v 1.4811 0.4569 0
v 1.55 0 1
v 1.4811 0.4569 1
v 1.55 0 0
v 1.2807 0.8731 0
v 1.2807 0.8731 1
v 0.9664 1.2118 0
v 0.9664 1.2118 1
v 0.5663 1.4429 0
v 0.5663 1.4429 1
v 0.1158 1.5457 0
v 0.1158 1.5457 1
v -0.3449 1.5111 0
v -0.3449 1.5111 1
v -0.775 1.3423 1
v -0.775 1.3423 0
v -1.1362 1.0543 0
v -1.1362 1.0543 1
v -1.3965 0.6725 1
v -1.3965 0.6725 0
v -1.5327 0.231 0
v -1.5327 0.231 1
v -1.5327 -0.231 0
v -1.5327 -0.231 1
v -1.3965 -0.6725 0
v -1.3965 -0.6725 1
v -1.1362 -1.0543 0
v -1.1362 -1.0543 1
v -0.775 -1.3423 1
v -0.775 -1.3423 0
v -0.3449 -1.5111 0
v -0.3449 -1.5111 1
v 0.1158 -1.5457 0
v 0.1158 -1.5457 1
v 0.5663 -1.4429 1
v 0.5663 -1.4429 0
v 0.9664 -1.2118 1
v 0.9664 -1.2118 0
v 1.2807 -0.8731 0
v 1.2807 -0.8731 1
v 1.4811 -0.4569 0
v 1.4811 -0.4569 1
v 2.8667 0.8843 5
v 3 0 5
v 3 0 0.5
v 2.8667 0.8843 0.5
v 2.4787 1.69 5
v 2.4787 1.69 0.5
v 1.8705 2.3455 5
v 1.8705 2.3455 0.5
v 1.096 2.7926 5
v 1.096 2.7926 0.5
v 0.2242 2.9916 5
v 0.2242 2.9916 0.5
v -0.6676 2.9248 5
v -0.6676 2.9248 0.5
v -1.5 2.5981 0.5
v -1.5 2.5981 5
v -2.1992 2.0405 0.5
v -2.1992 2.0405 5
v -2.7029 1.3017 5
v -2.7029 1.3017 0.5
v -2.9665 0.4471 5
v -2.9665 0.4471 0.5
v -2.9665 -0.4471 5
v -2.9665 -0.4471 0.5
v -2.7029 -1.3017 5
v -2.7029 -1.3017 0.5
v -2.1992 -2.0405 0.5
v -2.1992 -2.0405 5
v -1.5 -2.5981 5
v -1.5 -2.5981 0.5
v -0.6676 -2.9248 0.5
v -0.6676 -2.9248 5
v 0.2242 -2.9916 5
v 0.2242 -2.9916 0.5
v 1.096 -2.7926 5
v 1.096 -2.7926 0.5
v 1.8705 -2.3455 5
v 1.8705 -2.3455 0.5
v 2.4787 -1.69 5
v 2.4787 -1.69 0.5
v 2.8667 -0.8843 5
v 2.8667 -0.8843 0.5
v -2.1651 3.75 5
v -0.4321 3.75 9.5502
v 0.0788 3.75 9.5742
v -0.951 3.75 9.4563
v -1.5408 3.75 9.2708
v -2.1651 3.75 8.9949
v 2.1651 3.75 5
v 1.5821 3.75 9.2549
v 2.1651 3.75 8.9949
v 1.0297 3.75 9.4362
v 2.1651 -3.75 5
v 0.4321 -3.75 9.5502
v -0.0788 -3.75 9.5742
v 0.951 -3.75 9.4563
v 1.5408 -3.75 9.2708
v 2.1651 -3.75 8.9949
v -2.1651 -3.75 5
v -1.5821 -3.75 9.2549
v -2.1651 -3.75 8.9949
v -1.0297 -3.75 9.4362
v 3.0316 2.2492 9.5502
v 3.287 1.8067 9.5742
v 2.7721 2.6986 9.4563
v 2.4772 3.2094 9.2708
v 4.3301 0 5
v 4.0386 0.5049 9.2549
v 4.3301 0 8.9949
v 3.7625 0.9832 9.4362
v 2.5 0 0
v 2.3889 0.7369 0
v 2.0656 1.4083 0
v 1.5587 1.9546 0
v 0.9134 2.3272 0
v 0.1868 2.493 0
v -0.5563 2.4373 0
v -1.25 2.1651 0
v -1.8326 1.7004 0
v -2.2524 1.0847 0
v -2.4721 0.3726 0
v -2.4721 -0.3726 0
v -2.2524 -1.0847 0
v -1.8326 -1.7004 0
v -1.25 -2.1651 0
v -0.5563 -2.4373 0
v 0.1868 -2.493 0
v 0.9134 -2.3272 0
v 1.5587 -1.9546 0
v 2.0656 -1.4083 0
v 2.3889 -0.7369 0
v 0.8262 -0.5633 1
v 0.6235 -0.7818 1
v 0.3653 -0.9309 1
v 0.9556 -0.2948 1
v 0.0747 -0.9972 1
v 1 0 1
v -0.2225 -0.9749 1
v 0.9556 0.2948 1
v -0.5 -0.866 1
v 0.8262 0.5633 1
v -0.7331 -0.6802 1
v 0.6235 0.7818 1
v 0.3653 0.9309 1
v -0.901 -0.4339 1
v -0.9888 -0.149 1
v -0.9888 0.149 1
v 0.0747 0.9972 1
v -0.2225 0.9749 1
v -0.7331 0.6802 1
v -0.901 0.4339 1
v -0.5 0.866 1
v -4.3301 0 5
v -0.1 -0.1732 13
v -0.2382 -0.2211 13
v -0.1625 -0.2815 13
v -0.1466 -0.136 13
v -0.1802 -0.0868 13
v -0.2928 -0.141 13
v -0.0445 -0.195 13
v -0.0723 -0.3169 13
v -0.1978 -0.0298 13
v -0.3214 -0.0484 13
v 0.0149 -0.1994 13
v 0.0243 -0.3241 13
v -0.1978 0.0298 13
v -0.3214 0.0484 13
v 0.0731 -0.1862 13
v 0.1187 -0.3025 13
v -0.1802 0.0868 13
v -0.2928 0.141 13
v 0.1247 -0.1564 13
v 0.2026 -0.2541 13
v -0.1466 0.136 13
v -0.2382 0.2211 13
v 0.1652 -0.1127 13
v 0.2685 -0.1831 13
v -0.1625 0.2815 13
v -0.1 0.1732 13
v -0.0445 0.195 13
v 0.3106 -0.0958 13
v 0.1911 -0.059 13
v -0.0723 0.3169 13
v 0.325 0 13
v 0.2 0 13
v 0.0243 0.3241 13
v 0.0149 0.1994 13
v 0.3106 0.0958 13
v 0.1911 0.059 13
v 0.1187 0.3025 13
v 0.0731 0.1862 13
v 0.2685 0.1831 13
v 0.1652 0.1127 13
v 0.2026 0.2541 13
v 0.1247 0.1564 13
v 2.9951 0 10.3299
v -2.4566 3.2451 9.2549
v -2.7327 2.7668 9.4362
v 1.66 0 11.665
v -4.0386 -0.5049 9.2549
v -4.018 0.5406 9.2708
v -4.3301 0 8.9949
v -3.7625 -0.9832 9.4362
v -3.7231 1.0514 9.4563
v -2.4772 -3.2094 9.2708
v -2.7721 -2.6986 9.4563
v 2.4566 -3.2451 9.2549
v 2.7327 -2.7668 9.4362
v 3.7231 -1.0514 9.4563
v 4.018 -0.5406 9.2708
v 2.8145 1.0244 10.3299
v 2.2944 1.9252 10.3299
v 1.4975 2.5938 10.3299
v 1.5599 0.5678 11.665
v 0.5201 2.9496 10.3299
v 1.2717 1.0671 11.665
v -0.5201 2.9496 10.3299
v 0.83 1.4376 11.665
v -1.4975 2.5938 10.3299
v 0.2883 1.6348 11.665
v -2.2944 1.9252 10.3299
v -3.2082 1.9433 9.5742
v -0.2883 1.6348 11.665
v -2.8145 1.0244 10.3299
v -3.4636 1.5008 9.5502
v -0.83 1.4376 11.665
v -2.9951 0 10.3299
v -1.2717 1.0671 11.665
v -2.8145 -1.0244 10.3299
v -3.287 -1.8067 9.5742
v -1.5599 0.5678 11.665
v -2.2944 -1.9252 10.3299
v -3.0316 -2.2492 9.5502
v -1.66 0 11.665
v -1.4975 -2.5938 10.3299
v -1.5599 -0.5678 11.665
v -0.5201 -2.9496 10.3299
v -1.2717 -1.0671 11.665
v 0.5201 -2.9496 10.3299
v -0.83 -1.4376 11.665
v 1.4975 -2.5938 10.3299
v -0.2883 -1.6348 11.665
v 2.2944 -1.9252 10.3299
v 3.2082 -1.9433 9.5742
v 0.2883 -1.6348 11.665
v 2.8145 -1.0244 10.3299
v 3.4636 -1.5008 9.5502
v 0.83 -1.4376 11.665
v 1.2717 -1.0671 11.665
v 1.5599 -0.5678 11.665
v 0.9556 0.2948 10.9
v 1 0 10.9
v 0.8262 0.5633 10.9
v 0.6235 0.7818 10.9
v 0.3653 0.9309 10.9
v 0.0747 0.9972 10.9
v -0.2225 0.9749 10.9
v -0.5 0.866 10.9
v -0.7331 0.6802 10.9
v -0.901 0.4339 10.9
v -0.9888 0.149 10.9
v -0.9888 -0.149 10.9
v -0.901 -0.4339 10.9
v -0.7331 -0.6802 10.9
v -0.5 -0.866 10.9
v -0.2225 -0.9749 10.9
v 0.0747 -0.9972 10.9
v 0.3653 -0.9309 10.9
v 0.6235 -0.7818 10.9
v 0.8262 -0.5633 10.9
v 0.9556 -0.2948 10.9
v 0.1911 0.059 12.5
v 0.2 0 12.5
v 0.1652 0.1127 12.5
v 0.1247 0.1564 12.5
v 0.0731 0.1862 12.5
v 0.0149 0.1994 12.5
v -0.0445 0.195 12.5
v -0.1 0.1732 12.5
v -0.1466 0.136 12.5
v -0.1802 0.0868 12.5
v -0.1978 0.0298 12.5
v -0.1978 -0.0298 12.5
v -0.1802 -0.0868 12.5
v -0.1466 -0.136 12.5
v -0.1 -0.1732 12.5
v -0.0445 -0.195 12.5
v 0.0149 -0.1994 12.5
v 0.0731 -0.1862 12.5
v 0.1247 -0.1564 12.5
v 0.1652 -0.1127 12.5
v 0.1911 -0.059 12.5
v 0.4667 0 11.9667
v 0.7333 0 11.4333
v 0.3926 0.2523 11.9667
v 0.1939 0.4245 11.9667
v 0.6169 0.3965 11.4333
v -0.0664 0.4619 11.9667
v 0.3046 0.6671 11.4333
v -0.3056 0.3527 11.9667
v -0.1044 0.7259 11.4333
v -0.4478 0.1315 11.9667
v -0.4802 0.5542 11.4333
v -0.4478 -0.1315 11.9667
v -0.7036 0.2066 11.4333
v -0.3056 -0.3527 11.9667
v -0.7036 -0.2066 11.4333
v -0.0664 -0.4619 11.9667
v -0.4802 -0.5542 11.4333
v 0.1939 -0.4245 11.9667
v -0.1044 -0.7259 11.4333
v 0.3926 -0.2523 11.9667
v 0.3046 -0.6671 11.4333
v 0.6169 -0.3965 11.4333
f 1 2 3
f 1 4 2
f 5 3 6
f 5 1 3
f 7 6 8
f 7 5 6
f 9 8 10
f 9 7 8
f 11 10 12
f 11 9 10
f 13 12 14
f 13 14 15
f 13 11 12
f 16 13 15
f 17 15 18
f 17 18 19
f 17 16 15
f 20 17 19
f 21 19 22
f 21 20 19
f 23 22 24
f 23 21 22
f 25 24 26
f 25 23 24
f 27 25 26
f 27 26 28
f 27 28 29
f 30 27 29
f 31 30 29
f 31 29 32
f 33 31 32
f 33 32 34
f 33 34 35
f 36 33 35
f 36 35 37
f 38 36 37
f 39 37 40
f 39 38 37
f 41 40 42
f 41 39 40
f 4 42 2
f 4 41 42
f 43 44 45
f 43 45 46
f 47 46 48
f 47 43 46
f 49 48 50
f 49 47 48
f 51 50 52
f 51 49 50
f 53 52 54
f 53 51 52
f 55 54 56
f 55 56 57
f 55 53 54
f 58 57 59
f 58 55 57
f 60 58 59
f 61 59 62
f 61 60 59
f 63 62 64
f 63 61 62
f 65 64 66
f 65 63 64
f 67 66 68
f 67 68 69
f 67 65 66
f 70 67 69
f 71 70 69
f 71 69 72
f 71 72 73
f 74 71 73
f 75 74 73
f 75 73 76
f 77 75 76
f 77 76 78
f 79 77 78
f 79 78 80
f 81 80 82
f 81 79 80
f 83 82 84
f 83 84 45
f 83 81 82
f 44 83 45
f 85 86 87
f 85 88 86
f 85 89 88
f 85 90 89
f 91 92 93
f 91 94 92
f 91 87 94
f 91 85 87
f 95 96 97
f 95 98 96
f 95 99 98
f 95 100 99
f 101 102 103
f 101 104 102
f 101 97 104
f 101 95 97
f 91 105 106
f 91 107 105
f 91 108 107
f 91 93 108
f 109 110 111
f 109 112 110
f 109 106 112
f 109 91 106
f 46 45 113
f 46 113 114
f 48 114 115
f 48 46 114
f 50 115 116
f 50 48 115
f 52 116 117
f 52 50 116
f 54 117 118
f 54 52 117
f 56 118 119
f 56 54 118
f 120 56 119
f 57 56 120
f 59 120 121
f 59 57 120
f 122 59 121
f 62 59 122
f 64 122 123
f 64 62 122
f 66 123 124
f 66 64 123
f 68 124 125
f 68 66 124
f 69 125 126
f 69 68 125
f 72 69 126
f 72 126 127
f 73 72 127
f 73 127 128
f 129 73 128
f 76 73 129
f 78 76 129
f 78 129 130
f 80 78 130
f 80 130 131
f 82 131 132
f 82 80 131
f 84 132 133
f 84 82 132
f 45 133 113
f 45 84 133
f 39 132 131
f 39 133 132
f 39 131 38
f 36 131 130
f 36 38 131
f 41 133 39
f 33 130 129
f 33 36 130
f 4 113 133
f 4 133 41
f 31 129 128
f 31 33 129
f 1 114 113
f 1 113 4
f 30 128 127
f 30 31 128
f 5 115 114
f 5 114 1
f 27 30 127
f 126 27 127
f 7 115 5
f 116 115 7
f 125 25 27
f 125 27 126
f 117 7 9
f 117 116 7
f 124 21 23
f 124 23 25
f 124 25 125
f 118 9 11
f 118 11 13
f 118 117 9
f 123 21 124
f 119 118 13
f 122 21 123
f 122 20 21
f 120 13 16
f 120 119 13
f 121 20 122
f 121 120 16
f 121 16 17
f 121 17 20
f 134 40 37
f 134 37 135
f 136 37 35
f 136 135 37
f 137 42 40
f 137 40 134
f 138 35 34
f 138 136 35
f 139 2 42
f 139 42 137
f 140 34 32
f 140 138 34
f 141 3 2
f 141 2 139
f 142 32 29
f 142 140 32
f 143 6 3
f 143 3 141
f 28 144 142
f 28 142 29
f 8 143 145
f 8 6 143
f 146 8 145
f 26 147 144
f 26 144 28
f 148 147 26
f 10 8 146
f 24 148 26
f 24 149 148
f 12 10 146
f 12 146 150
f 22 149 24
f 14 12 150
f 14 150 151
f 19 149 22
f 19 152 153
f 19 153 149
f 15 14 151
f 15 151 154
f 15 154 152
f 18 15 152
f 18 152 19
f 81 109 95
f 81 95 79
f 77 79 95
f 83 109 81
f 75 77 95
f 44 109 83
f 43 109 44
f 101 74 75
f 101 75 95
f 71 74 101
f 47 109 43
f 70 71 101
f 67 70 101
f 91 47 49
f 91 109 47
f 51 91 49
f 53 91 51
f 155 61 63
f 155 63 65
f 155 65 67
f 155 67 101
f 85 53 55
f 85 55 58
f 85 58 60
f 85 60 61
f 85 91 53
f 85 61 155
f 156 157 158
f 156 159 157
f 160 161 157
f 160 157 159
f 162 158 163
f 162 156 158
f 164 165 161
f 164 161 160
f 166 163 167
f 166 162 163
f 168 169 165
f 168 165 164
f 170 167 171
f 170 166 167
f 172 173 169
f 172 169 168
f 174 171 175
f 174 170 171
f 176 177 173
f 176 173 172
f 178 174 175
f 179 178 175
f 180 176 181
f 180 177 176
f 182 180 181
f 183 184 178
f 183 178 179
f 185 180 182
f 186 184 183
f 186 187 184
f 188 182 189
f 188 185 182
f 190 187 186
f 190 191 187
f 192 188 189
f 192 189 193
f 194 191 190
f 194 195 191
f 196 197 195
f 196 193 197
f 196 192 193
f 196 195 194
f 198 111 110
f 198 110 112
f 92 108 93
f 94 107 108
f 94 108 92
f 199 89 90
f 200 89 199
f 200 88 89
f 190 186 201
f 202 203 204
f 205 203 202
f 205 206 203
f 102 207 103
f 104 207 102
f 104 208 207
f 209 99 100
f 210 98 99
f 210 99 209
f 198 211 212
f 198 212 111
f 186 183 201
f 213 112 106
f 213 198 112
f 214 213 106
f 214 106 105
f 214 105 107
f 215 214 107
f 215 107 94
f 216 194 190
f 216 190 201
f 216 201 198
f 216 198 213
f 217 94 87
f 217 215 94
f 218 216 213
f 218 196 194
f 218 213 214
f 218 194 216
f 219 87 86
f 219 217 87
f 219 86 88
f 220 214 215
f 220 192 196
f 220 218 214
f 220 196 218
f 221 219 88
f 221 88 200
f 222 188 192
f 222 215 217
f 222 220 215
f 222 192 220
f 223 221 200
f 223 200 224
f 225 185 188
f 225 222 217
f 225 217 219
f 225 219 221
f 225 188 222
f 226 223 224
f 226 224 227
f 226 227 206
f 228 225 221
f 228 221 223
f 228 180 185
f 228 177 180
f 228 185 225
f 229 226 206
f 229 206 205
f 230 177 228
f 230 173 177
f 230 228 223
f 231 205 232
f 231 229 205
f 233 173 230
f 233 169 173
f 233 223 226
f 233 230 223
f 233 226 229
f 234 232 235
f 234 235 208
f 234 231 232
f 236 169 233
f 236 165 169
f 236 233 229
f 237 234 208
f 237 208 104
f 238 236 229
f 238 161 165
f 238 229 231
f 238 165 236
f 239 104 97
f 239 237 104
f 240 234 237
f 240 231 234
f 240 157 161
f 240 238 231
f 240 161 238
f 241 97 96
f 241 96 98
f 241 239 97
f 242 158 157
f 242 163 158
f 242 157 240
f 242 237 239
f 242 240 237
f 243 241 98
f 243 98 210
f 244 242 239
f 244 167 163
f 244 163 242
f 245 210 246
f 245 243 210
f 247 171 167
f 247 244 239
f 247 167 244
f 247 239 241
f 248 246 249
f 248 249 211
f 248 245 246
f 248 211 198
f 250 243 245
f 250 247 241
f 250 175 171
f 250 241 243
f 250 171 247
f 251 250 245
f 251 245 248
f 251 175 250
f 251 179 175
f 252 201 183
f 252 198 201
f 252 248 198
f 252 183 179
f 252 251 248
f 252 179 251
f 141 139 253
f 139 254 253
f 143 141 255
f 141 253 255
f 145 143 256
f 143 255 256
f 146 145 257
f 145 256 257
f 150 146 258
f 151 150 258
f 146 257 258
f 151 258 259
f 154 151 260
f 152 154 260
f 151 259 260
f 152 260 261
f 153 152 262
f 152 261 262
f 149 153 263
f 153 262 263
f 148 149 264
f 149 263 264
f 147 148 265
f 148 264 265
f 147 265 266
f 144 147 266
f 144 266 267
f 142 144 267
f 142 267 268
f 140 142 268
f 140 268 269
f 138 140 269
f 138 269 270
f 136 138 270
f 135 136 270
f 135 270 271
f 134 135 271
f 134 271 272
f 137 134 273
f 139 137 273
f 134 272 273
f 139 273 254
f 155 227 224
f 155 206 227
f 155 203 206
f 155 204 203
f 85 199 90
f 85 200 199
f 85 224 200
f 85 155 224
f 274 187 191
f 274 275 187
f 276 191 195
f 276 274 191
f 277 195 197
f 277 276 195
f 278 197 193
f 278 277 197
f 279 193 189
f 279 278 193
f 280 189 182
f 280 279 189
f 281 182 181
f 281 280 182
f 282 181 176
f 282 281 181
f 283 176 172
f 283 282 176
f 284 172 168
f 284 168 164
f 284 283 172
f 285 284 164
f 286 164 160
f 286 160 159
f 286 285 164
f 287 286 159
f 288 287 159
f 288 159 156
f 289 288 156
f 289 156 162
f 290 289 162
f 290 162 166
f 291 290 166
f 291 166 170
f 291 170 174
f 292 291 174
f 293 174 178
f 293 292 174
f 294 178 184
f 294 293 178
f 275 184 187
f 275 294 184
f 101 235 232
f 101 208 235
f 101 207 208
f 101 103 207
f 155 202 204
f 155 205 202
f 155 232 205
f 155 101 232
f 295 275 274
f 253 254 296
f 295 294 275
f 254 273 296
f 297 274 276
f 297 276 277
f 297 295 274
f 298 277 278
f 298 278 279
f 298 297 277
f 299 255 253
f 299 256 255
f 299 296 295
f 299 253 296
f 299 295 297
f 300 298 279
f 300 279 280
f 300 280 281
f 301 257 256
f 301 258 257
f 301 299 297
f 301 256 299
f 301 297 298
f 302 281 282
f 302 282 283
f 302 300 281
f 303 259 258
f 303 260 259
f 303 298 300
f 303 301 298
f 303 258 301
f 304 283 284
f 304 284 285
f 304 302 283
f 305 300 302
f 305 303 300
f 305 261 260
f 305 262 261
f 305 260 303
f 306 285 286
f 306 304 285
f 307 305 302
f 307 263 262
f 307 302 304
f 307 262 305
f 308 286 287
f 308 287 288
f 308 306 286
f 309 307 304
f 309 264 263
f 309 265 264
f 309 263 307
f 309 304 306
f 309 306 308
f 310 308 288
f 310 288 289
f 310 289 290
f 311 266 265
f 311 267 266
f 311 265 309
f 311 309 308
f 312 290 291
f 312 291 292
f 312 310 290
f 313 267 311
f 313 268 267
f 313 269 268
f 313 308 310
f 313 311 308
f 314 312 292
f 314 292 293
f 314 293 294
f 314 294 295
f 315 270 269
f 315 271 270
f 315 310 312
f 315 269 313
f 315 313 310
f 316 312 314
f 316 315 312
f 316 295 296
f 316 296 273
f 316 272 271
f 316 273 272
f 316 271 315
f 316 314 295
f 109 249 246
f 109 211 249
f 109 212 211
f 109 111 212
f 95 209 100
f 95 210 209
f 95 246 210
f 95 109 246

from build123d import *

# Parameters (mm, degrees)
SKETCH2_R          = 8.325
CUT_EXTRUDE2_DEPTH = 10
CHAMFER1_SIZE      = 0.5


with BuildPart() as part:
    # Sketch1 → Revolve1 (revolve)
    with BuildSketch(Plane(origin=(0, 0, 0), x_dir=(1, 0, 0), z_dir=(0, 1, 0))):
        Polygon((1.55, 0), (3, 0), (3, -5), (8.325, -5), (0.325, -13), (0.2, -13), (0.2, -12.5), (1, -10.9), (1, -10), (1, -1), (1.55, -1), align=None)
    revolve(axis=Axis((0, 0, 0), (0, 0, 1)))

    # Sketch2 → Cut-Extrude2 (cut)
    with BuildSketch(Plane(origin=(0, 0, 5), x_dir=(-1, 0, 0), z_dir=(0, 0, -1))):
        Circle(SKETCH2_R)
        Polygon((-4.330127019, 0), (-2.165063509, -3.75), (2.165063509, -3.75), (4.330127019, 0), (2.165063509, 3.75), (-2.165063509, 3.75), align=None, mode=Mode.SUBTRACT)
    extrude(amount=-CUT_EXTRUDE2_DEPTH, mode=Mode.SUBTRACT)

    # Chamfer1
    chamfer1_edges = [part.edges().sort_by_distance(p)[0] for p in [
        (-3, 0, 0),
    ]]
    chamfer(chamfer1_edges, length=CHAMFER1_SIZE)


solid = part.part
